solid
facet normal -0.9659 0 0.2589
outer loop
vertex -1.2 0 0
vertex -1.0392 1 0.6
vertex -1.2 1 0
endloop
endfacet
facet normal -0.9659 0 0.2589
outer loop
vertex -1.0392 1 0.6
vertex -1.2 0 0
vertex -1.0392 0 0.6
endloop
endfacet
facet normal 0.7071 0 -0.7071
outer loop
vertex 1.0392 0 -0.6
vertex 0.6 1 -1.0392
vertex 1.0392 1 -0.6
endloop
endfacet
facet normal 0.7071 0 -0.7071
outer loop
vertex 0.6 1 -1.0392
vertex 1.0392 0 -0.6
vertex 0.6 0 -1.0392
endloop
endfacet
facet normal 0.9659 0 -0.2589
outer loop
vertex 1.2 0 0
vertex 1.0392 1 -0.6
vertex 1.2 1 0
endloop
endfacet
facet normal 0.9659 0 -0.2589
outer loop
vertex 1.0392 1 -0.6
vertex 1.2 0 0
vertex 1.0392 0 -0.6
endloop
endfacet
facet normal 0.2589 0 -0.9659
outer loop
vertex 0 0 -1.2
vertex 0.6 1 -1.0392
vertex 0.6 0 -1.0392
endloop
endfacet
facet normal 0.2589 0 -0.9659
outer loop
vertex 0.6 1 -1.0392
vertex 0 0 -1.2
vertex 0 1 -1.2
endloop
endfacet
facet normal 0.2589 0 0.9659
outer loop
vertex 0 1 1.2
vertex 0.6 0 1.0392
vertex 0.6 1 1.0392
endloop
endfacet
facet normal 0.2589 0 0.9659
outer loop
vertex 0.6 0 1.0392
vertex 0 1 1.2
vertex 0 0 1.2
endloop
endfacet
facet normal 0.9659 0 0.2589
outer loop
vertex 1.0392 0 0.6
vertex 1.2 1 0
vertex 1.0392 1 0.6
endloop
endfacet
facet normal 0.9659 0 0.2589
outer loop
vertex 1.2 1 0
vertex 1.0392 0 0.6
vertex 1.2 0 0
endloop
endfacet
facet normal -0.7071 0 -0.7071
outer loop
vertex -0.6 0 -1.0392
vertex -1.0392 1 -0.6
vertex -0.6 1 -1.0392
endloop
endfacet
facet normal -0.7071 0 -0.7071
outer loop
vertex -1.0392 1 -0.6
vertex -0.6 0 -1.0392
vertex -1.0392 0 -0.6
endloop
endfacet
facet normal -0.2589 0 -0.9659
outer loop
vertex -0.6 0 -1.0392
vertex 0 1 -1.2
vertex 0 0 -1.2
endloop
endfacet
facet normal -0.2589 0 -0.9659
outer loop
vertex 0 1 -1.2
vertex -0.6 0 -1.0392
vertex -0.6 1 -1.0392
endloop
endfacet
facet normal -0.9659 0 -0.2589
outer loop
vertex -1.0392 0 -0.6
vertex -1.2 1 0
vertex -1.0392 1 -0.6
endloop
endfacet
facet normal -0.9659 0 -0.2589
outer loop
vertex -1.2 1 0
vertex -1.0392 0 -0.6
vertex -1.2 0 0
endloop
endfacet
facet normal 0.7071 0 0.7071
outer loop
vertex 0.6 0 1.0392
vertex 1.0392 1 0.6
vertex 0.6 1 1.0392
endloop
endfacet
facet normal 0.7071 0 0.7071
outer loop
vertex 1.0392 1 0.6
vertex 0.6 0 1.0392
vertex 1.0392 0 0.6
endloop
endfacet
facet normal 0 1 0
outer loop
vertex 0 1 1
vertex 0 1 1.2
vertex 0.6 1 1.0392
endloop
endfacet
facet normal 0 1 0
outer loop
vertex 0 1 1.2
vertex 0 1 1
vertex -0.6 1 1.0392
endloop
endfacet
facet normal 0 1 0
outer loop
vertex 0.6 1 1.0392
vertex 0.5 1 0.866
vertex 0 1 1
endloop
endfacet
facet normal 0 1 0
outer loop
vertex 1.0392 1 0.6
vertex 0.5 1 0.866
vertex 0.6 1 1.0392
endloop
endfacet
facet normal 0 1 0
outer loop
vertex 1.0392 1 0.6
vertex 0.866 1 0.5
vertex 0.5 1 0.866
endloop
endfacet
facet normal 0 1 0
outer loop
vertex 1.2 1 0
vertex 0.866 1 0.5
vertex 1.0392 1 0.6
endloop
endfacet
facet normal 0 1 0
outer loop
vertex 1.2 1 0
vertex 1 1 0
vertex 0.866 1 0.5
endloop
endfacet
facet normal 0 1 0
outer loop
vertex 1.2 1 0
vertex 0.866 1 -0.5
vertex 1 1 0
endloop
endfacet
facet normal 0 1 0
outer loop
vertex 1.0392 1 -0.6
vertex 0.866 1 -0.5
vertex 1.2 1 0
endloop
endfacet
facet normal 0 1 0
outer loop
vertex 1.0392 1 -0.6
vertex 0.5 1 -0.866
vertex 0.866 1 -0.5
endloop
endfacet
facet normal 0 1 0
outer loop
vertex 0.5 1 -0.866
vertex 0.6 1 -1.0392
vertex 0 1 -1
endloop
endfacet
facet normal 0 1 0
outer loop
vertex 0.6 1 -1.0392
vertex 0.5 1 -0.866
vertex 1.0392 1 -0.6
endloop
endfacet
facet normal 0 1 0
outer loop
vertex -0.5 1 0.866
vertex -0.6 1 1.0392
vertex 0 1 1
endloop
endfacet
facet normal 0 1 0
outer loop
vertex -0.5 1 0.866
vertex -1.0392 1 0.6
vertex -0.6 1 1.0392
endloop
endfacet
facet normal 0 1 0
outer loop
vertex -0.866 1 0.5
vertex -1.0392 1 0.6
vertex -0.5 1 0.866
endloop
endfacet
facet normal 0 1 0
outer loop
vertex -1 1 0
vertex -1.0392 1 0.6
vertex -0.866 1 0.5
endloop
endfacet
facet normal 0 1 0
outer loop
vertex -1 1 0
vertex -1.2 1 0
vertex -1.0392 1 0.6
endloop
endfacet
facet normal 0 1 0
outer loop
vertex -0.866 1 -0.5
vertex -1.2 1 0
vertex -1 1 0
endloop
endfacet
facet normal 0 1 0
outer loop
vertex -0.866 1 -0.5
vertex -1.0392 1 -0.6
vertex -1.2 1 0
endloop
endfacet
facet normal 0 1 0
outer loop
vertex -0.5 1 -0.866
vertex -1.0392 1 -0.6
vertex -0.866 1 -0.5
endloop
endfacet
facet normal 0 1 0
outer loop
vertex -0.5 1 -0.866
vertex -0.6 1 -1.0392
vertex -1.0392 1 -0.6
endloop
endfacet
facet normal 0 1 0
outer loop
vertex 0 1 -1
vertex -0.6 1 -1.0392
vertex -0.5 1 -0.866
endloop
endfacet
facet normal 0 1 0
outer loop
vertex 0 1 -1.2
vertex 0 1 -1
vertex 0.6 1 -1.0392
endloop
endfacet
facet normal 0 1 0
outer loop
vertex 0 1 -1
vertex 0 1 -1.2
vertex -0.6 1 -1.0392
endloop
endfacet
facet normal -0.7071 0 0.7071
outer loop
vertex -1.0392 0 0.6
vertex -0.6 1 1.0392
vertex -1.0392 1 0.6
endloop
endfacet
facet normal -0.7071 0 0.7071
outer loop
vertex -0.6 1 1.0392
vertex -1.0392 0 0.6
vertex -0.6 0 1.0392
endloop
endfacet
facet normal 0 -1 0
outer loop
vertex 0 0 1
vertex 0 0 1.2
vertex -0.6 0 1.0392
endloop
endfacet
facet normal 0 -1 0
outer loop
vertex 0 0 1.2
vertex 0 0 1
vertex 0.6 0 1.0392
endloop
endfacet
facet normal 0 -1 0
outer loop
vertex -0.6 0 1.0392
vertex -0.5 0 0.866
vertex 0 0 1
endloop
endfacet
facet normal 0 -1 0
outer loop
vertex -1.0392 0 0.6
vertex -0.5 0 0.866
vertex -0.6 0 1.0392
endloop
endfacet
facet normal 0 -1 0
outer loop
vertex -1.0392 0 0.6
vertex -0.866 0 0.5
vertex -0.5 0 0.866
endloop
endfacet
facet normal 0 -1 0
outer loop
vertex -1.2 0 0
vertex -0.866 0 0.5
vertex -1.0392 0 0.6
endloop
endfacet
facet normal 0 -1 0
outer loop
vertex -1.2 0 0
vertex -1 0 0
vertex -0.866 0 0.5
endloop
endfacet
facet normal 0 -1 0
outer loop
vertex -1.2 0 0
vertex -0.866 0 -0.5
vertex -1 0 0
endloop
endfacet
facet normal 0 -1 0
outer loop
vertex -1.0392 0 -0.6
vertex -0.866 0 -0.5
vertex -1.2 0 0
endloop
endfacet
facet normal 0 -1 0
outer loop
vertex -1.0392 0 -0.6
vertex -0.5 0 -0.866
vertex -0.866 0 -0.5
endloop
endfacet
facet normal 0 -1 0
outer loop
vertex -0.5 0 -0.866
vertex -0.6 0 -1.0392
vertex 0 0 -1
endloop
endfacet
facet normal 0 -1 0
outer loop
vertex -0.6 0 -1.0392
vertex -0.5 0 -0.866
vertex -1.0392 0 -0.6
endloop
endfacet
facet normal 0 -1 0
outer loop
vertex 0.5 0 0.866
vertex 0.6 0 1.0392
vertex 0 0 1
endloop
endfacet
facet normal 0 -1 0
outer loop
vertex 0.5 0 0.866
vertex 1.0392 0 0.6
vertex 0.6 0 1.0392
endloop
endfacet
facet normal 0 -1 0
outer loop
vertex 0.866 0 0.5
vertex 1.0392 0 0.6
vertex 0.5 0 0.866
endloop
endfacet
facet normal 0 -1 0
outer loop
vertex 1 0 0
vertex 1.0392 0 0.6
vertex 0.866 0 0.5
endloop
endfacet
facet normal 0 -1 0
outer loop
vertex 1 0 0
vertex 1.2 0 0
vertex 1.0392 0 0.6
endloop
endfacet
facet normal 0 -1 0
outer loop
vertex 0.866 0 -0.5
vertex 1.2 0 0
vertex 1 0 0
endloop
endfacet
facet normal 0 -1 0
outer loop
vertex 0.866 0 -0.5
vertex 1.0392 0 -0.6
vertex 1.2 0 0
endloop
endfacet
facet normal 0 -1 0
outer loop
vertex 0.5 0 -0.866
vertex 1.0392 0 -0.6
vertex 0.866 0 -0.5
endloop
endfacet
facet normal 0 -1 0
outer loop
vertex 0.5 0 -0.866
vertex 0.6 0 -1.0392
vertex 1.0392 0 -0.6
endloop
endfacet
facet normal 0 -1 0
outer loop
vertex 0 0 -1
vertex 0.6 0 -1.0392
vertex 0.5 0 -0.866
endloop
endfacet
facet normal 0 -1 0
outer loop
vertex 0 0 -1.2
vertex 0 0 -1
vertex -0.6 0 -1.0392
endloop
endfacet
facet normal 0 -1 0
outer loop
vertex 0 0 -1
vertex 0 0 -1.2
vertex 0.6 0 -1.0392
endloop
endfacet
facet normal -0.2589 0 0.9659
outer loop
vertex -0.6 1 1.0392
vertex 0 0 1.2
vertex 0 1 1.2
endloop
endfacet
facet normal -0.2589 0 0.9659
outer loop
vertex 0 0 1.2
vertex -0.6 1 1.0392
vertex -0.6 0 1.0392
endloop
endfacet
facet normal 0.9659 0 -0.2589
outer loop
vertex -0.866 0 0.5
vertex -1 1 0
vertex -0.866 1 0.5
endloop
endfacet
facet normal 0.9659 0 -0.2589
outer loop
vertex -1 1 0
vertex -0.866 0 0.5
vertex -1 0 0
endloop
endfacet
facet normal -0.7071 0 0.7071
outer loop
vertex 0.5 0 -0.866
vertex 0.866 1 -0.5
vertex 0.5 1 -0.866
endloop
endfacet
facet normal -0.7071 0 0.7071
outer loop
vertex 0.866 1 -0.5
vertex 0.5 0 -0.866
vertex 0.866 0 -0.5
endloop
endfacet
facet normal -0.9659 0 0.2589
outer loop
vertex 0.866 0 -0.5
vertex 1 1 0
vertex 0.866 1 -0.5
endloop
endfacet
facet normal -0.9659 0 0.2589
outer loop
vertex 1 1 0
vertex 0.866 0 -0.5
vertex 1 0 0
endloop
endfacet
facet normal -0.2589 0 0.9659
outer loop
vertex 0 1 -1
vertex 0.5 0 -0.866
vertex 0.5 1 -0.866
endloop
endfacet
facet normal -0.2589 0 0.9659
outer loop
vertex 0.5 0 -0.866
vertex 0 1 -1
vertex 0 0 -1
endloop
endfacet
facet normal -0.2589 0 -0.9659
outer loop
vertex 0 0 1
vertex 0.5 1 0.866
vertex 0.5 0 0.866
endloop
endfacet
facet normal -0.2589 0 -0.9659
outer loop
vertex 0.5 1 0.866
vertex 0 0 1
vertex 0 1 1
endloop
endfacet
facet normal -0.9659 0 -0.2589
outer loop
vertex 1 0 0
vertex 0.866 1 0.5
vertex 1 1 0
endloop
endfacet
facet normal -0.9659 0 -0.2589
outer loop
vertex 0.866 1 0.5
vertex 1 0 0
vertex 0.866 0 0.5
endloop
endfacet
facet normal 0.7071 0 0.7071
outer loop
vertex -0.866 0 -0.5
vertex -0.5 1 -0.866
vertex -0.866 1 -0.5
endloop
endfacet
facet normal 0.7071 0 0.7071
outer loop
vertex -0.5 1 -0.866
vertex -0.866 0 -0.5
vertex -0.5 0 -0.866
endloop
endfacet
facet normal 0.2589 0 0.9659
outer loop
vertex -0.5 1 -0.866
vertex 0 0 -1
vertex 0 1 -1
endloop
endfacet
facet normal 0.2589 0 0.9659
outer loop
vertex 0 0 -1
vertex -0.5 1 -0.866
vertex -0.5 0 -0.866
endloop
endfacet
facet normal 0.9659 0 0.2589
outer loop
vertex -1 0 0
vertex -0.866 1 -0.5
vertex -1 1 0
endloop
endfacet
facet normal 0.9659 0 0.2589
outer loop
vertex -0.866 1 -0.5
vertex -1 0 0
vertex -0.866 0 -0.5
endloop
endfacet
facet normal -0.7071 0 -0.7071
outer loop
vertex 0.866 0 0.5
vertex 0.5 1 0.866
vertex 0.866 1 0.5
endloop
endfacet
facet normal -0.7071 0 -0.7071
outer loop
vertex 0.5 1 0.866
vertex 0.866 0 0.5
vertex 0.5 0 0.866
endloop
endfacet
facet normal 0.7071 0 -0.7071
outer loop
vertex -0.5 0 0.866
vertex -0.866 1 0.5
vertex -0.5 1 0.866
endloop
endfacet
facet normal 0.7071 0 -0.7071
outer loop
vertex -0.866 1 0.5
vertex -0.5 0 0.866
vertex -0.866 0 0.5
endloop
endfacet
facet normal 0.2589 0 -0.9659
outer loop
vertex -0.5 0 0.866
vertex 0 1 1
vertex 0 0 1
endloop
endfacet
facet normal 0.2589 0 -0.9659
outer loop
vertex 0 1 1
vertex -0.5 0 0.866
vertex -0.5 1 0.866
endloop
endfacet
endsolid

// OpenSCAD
difference() {
    rotate([-90, 0, 0]) {
        cylinder(h=1, r=1.2, center=false, $fn=12);
    }
    translate([0, -2, 0]) {
        rotate([-90, 0, 0]) {
            cylinder(h=4, r=1.0, center=false, $fn=12);
        }
    }
}
